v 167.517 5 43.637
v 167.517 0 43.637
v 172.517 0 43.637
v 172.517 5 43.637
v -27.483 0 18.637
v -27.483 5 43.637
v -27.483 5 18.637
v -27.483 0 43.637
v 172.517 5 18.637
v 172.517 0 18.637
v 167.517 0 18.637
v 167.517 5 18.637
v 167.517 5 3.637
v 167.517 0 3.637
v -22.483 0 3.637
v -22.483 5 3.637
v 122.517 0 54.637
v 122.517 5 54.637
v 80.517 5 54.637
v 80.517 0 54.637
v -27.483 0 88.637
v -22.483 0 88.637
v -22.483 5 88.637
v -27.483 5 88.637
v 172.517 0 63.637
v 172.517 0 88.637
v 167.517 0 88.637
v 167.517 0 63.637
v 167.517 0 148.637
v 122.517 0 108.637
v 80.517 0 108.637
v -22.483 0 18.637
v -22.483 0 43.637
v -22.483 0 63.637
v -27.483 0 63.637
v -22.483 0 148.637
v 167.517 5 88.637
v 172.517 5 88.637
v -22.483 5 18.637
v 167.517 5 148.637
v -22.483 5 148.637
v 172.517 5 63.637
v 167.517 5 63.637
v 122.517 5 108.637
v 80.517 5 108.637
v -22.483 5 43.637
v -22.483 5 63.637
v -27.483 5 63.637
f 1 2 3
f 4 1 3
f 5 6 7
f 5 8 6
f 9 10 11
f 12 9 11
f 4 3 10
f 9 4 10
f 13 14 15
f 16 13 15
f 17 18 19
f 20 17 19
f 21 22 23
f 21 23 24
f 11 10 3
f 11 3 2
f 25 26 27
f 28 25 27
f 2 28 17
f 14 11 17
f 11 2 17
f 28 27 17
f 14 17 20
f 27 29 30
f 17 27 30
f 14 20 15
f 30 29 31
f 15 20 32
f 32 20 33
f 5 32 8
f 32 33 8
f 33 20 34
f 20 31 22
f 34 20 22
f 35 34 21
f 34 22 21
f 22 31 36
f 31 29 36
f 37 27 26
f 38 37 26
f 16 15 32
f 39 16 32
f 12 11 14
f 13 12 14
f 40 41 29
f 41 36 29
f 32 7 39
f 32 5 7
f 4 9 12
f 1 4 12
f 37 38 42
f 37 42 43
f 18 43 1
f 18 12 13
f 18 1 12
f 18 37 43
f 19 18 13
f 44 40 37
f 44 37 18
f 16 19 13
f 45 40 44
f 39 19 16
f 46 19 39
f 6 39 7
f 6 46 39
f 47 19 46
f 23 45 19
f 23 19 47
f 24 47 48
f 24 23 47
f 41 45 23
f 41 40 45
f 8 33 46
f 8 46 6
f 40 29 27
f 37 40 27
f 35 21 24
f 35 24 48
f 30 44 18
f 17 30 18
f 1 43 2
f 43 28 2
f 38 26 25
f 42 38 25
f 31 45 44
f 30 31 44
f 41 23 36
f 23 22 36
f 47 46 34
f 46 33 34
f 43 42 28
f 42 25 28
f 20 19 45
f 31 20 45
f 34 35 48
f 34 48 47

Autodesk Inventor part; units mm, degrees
ref_plane "YZ Plane" through (0, 0, 0) normal (1, 0, 0) x (0, 1, 0)
ref_plane "XZ Plane" through (0, 0, 0) normal (0, 1, 0) x (-1, 0, 0)
ref_plane "XY Plane" through (0, 0, 0) normal (0, 0, 1) x (1, 0, 0)
sketch "Sketch1" plane through (0, 0, 0) normal (0, 1, 0) x (-1, 0, 0)
  line L0 (22.4826, 148.6372) -> (-167.5174, 148.6372)
  line L1 (-167.5174, 148.6372) -> (-167.5174, 3.6372)
  line L2 (-167.5174, 3.6372) -> (22.4826, 3.6372)
  line L3 (22.4826, 3.6372) -> (22.4826, 148.6372)
  line L4 (-167.5174, 88.6372) -> (-172.5174, 88.6372)
  line L5 (-172.5174, 88.6372) -> (-172.5174, 63.6372)
  line L6 (-172.5174, 63.6372) -> (-167.5174, 63.6372)
  line L7 (-167.5174, 63.6372) -> (-167.5174, 88.6372)
  line L8 (-167.5174, 43.6372) -> (-172.5174, 43.6372)
  line L9 (-172.5174, 43.6372) -> (-172.5174, 18.6372)
  line L10 (-172.5174, 18.6372) -> (-167.5174, 18.6372)
  line L11 (-167.5174, 18.6372) -> (-167.5174, 43.6372)
  line L12 (-72.5174, 148.6372) -> (-72.5174, 3.6372) construction
  line L13 (22.4826, 88.6372) -> (27.4826, 88.6372)
  line L14 (27.4826, 88.6372) -> (27.4826, 63.6372)
  line L15 (27.4826, 63.6372) -> (22.4826, 63.6372)
  line L16 (22.4826, 43.6372) -> (27.4826, 43.6372)
  line L17 (27.4826, 43.6372) -> (27.4826, 18.6372)
  line L18 (27.4826, 18.6372) -> (22.4826, 18.6372)
  point P0 (0, 0)
  dimension "d0" = 190
  dimension "d1" = 145
  dimension "d2" = 5
  dimension "d3" = 25
  dimension "d4" = 5
  dimension "d5" = 25
  dimension "d6" = 20
  dimension "d7" = 15
extrude "Extrusion1" add sketch "Sketch1" along normal blind 5
sketch "Sketch2" plane through (0, 5, 0) normal (0, 1, 0) x (1, 0, 0)
  line L0 (-27.4826, -43.6372) -> (-22.4826, -43.6372) projected
  line L1 (-22.4826, -43.6372) -> (-22.4826, -63.6372) projected
  line L2 (-22.4826, -63.6372) -> (-27.4826, -63.6372) projected
  line L3 (-27.4826, -63.6372) -> (-27.4826, -88.6372) projected
  line L4 (-27.4826, -88.6372) -> (-22.4826, -88.6372) projected
  line L5 (-22.4826, -88.6372) -> (-22.4826, -148.6372) projected
  line L6 (-22.4826, -148.6372) -> (167.5174, -148.6372) projected
  line L7 (167.5174, -148.6372) -> (167.5174, -88.6372) projected
  line L8 (167.5174, -88.6372) -> (172.5174, -88.6372) projected
  line L9 (172.5174, -88.6372) -> (172.5174, -63.6372) projected
  line L10 (172.5174, -63.6372) -> (167.5174, -63.6372) projected
  line L11 (167.5174, -63.6372) -> (167.5174, -43.6372) projected
  line L12 (167.5174, -43.6372) -> (172.5174, -43.6372) projected
  line L13 (172.5174, -43.6372) -> (172.5174, -18.6372) projected
  line L14 (172.5174, -18.6372) -> (167.5174, -18.6372) projected
  line L15 (167.5174, -18.6372) -> (167.5174, -3.6372) projected
  line L16 (167.5174, -3.6372) -> (-22.4826, -3.6372) projected
  line L17 (-22.4826, -3.6372) -> (-22.4826, -18.6372) projected
  line L18 (-22.4826, -18.6372) -> (-27.4826, -18.6372) projected
  line L19 (-27.4826, -18.6372) -> (-27.4826, -43.6372) projected
  line L20 (80.5174, -108.6372) -> (122.5174, -108.6372)
  line L21 (122.5174, -108.6372) -> (122.5174, -54.6372)
  line L22 (122.5174, -54.6372) -> (80.5174, -54.6372)
  line L23 (80.5174, -54.6372) -> (80.5174, -108.6372)
  point P0 (0, 0)
  dimension "d10" = 42
  dimension "d11" = 54
  dimension "d12" = 45
  dimension "d13" = 40
extrude "Extrusion2" cut sketch "Sketch2" against normal blind 5 contours L23 L22 L21 L20
properties part number "Top 2"
